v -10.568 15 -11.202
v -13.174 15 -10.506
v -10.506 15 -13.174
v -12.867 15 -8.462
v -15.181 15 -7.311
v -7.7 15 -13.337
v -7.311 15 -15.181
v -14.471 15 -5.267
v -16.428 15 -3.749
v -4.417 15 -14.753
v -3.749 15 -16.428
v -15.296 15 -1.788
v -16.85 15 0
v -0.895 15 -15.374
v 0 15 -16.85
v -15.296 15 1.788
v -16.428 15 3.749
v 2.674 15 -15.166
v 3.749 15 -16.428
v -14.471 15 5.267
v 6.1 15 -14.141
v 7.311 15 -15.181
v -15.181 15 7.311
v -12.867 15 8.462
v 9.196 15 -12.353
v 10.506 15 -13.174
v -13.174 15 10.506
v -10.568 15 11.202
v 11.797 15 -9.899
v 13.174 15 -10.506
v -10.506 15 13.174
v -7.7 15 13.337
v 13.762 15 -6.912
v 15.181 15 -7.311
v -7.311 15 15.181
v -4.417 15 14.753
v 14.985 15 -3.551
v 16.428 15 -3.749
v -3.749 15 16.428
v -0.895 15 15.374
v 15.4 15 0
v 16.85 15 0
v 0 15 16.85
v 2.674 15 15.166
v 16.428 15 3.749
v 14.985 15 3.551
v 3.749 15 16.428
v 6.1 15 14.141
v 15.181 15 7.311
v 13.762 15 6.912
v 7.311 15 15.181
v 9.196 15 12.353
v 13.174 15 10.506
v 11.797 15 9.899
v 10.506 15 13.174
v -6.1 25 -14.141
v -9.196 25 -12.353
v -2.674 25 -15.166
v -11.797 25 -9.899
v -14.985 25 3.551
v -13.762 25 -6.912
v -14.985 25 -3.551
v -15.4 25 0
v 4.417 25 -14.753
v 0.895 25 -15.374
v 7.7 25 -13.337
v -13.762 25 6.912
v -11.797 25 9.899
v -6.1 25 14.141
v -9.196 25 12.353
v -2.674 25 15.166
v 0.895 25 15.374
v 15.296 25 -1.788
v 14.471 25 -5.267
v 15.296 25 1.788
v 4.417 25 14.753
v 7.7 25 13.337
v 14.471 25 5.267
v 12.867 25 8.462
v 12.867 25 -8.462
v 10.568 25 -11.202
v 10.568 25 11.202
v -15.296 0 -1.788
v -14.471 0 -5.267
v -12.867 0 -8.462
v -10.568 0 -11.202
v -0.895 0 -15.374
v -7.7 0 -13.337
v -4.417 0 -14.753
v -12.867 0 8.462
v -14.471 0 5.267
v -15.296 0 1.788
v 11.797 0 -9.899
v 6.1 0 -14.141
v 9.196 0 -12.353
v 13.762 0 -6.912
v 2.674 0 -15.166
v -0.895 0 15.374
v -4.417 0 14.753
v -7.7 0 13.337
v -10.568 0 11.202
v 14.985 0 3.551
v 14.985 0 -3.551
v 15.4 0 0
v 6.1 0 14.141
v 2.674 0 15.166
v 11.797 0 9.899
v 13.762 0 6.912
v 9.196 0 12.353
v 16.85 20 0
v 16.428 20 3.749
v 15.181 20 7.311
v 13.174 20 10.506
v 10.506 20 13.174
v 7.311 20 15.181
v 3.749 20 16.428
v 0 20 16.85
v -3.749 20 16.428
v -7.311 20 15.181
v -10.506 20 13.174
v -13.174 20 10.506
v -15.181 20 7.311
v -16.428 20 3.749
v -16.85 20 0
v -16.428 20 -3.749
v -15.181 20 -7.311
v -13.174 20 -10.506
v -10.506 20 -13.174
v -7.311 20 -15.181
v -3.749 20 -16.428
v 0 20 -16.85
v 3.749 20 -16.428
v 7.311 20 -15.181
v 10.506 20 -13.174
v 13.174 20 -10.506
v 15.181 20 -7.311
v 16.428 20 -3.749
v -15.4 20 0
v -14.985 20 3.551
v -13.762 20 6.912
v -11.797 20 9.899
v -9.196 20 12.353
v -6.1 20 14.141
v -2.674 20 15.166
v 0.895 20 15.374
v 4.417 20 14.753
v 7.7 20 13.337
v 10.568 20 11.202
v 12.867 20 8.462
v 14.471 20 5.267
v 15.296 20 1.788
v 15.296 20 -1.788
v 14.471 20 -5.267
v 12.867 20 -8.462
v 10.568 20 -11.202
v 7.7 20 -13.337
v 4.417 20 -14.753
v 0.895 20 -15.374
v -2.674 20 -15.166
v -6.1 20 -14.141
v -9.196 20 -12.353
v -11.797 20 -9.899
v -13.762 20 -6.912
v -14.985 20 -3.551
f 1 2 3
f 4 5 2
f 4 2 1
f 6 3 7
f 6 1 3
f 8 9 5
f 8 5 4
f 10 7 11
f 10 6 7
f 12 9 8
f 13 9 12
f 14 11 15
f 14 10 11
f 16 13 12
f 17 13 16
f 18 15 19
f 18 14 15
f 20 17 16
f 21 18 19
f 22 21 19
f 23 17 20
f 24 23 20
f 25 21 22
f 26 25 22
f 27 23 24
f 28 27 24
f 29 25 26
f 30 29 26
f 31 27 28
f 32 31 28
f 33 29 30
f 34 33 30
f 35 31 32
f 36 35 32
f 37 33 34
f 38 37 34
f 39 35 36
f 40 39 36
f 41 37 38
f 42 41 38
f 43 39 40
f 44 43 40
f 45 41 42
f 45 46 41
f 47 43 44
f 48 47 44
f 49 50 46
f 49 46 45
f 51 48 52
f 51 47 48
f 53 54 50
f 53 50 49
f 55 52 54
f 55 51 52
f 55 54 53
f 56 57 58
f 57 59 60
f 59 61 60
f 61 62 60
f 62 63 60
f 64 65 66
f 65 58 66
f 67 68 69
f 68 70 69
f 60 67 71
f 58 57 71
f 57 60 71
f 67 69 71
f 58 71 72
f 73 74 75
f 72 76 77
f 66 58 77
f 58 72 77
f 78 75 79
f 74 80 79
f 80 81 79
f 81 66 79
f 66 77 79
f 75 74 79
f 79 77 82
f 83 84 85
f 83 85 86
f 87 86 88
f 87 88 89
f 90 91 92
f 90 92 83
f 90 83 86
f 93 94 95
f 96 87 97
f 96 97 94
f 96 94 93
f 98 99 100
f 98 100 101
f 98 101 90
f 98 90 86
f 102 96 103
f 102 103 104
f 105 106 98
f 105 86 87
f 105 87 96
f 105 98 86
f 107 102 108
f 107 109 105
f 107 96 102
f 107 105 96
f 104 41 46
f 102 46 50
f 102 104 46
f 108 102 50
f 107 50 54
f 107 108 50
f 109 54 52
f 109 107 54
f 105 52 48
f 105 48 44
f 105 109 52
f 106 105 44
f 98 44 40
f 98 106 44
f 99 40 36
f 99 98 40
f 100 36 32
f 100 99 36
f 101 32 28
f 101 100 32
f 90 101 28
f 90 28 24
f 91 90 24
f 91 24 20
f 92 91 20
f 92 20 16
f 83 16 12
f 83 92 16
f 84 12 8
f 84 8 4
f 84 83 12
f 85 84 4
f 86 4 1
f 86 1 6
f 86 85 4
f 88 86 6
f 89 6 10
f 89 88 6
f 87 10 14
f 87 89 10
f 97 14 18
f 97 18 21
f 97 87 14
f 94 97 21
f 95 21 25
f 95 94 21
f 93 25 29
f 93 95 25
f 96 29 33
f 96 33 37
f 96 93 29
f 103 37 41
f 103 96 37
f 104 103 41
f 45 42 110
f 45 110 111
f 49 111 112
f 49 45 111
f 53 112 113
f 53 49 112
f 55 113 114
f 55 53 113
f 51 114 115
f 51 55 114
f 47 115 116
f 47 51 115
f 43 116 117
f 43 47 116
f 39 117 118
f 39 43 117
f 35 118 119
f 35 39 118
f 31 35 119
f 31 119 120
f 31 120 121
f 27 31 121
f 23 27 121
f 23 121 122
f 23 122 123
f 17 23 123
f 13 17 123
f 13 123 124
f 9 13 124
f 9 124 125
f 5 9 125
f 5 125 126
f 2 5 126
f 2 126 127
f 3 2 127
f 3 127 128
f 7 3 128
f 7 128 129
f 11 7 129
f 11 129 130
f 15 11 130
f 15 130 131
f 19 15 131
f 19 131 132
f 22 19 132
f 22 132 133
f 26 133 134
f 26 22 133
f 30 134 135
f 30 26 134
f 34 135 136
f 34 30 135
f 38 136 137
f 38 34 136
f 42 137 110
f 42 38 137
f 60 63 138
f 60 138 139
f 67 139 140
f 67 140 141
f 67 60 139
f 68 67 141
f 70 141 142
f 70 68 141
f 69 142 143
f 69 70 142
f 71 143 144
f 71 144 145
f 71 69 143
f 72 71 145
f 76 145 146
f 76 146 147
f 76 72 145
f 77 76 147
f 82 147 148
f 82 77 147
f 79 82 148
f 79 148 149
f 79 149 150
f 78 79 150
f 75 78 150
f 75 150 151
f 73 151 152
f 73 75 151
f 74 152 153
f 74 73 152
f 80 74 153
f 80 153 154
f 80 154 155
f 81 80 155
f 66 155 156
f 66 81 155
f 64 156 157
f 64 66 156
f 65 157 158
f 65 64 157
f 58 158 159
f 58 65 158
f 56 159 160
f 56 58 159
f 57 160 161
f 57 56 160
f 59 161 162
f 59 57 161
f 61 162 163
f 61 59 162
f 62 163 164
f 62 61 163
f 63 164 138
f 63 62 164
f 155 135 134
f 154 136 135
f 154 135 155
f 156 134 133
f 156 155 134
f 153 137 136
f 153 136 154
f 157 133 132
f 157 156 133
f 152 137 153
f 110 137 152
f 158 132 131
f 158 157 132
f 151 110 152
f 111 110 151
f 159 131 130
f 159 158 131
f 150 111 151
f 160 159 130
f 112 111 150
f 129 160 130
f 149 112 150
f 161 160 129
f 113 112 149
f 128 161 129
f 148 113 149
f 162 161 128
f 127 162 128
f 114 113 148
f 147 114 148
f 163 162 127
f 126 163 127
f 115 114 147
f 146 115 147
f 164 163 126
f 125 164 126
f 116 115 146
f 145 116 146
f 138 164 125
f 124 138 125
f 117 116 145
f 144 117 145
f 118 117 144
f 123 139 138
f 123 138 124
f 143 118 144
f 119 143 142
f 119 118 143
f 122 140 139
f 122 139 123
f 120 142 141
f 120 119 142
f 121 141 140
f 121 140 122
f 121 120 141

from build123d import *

# Parameters (mm, degrees)
F0_R     = 16.85
F1_DEPTH = 25
F2_R     = 22.410556
F2_R_2   = 15.4
F3_DEPTH = 15
F4_R     = 22.657316
F4_R_2   = 15.4
F5_DEPTH = 5


with BuildPart() as f1:
    # F0 (on Front) → F1 (new body)
    with BuildSketch(Plane.XZ):
        Circle(F0_R)
    extrude(amount=-F1_DEPTH)

    # F2 (on Front) → F3 (cut)
    with BuildSketch(Plane.XZ):
        Circle(F2_R)
        Circle(F2_R_2, mode=Mode.SUBTRACT)
    extrude(amount=-F3_DEPTH, mode=Mode.SUBTRACT)

    # F4 (on face) → F5 (cut)
    with BuildSketch(Plane(origin=(0, 25, 0), x_dir=(-1, 0, 0), z_dir=(0, 1, 0))):
        Circle(F4_R)
        Circle(F4_R_2, mode=Mode.SUBTRACT)
    extrude(amount=-F5_DEPTH, mode=Mode.SUBTRACT)


solid = f1.part
